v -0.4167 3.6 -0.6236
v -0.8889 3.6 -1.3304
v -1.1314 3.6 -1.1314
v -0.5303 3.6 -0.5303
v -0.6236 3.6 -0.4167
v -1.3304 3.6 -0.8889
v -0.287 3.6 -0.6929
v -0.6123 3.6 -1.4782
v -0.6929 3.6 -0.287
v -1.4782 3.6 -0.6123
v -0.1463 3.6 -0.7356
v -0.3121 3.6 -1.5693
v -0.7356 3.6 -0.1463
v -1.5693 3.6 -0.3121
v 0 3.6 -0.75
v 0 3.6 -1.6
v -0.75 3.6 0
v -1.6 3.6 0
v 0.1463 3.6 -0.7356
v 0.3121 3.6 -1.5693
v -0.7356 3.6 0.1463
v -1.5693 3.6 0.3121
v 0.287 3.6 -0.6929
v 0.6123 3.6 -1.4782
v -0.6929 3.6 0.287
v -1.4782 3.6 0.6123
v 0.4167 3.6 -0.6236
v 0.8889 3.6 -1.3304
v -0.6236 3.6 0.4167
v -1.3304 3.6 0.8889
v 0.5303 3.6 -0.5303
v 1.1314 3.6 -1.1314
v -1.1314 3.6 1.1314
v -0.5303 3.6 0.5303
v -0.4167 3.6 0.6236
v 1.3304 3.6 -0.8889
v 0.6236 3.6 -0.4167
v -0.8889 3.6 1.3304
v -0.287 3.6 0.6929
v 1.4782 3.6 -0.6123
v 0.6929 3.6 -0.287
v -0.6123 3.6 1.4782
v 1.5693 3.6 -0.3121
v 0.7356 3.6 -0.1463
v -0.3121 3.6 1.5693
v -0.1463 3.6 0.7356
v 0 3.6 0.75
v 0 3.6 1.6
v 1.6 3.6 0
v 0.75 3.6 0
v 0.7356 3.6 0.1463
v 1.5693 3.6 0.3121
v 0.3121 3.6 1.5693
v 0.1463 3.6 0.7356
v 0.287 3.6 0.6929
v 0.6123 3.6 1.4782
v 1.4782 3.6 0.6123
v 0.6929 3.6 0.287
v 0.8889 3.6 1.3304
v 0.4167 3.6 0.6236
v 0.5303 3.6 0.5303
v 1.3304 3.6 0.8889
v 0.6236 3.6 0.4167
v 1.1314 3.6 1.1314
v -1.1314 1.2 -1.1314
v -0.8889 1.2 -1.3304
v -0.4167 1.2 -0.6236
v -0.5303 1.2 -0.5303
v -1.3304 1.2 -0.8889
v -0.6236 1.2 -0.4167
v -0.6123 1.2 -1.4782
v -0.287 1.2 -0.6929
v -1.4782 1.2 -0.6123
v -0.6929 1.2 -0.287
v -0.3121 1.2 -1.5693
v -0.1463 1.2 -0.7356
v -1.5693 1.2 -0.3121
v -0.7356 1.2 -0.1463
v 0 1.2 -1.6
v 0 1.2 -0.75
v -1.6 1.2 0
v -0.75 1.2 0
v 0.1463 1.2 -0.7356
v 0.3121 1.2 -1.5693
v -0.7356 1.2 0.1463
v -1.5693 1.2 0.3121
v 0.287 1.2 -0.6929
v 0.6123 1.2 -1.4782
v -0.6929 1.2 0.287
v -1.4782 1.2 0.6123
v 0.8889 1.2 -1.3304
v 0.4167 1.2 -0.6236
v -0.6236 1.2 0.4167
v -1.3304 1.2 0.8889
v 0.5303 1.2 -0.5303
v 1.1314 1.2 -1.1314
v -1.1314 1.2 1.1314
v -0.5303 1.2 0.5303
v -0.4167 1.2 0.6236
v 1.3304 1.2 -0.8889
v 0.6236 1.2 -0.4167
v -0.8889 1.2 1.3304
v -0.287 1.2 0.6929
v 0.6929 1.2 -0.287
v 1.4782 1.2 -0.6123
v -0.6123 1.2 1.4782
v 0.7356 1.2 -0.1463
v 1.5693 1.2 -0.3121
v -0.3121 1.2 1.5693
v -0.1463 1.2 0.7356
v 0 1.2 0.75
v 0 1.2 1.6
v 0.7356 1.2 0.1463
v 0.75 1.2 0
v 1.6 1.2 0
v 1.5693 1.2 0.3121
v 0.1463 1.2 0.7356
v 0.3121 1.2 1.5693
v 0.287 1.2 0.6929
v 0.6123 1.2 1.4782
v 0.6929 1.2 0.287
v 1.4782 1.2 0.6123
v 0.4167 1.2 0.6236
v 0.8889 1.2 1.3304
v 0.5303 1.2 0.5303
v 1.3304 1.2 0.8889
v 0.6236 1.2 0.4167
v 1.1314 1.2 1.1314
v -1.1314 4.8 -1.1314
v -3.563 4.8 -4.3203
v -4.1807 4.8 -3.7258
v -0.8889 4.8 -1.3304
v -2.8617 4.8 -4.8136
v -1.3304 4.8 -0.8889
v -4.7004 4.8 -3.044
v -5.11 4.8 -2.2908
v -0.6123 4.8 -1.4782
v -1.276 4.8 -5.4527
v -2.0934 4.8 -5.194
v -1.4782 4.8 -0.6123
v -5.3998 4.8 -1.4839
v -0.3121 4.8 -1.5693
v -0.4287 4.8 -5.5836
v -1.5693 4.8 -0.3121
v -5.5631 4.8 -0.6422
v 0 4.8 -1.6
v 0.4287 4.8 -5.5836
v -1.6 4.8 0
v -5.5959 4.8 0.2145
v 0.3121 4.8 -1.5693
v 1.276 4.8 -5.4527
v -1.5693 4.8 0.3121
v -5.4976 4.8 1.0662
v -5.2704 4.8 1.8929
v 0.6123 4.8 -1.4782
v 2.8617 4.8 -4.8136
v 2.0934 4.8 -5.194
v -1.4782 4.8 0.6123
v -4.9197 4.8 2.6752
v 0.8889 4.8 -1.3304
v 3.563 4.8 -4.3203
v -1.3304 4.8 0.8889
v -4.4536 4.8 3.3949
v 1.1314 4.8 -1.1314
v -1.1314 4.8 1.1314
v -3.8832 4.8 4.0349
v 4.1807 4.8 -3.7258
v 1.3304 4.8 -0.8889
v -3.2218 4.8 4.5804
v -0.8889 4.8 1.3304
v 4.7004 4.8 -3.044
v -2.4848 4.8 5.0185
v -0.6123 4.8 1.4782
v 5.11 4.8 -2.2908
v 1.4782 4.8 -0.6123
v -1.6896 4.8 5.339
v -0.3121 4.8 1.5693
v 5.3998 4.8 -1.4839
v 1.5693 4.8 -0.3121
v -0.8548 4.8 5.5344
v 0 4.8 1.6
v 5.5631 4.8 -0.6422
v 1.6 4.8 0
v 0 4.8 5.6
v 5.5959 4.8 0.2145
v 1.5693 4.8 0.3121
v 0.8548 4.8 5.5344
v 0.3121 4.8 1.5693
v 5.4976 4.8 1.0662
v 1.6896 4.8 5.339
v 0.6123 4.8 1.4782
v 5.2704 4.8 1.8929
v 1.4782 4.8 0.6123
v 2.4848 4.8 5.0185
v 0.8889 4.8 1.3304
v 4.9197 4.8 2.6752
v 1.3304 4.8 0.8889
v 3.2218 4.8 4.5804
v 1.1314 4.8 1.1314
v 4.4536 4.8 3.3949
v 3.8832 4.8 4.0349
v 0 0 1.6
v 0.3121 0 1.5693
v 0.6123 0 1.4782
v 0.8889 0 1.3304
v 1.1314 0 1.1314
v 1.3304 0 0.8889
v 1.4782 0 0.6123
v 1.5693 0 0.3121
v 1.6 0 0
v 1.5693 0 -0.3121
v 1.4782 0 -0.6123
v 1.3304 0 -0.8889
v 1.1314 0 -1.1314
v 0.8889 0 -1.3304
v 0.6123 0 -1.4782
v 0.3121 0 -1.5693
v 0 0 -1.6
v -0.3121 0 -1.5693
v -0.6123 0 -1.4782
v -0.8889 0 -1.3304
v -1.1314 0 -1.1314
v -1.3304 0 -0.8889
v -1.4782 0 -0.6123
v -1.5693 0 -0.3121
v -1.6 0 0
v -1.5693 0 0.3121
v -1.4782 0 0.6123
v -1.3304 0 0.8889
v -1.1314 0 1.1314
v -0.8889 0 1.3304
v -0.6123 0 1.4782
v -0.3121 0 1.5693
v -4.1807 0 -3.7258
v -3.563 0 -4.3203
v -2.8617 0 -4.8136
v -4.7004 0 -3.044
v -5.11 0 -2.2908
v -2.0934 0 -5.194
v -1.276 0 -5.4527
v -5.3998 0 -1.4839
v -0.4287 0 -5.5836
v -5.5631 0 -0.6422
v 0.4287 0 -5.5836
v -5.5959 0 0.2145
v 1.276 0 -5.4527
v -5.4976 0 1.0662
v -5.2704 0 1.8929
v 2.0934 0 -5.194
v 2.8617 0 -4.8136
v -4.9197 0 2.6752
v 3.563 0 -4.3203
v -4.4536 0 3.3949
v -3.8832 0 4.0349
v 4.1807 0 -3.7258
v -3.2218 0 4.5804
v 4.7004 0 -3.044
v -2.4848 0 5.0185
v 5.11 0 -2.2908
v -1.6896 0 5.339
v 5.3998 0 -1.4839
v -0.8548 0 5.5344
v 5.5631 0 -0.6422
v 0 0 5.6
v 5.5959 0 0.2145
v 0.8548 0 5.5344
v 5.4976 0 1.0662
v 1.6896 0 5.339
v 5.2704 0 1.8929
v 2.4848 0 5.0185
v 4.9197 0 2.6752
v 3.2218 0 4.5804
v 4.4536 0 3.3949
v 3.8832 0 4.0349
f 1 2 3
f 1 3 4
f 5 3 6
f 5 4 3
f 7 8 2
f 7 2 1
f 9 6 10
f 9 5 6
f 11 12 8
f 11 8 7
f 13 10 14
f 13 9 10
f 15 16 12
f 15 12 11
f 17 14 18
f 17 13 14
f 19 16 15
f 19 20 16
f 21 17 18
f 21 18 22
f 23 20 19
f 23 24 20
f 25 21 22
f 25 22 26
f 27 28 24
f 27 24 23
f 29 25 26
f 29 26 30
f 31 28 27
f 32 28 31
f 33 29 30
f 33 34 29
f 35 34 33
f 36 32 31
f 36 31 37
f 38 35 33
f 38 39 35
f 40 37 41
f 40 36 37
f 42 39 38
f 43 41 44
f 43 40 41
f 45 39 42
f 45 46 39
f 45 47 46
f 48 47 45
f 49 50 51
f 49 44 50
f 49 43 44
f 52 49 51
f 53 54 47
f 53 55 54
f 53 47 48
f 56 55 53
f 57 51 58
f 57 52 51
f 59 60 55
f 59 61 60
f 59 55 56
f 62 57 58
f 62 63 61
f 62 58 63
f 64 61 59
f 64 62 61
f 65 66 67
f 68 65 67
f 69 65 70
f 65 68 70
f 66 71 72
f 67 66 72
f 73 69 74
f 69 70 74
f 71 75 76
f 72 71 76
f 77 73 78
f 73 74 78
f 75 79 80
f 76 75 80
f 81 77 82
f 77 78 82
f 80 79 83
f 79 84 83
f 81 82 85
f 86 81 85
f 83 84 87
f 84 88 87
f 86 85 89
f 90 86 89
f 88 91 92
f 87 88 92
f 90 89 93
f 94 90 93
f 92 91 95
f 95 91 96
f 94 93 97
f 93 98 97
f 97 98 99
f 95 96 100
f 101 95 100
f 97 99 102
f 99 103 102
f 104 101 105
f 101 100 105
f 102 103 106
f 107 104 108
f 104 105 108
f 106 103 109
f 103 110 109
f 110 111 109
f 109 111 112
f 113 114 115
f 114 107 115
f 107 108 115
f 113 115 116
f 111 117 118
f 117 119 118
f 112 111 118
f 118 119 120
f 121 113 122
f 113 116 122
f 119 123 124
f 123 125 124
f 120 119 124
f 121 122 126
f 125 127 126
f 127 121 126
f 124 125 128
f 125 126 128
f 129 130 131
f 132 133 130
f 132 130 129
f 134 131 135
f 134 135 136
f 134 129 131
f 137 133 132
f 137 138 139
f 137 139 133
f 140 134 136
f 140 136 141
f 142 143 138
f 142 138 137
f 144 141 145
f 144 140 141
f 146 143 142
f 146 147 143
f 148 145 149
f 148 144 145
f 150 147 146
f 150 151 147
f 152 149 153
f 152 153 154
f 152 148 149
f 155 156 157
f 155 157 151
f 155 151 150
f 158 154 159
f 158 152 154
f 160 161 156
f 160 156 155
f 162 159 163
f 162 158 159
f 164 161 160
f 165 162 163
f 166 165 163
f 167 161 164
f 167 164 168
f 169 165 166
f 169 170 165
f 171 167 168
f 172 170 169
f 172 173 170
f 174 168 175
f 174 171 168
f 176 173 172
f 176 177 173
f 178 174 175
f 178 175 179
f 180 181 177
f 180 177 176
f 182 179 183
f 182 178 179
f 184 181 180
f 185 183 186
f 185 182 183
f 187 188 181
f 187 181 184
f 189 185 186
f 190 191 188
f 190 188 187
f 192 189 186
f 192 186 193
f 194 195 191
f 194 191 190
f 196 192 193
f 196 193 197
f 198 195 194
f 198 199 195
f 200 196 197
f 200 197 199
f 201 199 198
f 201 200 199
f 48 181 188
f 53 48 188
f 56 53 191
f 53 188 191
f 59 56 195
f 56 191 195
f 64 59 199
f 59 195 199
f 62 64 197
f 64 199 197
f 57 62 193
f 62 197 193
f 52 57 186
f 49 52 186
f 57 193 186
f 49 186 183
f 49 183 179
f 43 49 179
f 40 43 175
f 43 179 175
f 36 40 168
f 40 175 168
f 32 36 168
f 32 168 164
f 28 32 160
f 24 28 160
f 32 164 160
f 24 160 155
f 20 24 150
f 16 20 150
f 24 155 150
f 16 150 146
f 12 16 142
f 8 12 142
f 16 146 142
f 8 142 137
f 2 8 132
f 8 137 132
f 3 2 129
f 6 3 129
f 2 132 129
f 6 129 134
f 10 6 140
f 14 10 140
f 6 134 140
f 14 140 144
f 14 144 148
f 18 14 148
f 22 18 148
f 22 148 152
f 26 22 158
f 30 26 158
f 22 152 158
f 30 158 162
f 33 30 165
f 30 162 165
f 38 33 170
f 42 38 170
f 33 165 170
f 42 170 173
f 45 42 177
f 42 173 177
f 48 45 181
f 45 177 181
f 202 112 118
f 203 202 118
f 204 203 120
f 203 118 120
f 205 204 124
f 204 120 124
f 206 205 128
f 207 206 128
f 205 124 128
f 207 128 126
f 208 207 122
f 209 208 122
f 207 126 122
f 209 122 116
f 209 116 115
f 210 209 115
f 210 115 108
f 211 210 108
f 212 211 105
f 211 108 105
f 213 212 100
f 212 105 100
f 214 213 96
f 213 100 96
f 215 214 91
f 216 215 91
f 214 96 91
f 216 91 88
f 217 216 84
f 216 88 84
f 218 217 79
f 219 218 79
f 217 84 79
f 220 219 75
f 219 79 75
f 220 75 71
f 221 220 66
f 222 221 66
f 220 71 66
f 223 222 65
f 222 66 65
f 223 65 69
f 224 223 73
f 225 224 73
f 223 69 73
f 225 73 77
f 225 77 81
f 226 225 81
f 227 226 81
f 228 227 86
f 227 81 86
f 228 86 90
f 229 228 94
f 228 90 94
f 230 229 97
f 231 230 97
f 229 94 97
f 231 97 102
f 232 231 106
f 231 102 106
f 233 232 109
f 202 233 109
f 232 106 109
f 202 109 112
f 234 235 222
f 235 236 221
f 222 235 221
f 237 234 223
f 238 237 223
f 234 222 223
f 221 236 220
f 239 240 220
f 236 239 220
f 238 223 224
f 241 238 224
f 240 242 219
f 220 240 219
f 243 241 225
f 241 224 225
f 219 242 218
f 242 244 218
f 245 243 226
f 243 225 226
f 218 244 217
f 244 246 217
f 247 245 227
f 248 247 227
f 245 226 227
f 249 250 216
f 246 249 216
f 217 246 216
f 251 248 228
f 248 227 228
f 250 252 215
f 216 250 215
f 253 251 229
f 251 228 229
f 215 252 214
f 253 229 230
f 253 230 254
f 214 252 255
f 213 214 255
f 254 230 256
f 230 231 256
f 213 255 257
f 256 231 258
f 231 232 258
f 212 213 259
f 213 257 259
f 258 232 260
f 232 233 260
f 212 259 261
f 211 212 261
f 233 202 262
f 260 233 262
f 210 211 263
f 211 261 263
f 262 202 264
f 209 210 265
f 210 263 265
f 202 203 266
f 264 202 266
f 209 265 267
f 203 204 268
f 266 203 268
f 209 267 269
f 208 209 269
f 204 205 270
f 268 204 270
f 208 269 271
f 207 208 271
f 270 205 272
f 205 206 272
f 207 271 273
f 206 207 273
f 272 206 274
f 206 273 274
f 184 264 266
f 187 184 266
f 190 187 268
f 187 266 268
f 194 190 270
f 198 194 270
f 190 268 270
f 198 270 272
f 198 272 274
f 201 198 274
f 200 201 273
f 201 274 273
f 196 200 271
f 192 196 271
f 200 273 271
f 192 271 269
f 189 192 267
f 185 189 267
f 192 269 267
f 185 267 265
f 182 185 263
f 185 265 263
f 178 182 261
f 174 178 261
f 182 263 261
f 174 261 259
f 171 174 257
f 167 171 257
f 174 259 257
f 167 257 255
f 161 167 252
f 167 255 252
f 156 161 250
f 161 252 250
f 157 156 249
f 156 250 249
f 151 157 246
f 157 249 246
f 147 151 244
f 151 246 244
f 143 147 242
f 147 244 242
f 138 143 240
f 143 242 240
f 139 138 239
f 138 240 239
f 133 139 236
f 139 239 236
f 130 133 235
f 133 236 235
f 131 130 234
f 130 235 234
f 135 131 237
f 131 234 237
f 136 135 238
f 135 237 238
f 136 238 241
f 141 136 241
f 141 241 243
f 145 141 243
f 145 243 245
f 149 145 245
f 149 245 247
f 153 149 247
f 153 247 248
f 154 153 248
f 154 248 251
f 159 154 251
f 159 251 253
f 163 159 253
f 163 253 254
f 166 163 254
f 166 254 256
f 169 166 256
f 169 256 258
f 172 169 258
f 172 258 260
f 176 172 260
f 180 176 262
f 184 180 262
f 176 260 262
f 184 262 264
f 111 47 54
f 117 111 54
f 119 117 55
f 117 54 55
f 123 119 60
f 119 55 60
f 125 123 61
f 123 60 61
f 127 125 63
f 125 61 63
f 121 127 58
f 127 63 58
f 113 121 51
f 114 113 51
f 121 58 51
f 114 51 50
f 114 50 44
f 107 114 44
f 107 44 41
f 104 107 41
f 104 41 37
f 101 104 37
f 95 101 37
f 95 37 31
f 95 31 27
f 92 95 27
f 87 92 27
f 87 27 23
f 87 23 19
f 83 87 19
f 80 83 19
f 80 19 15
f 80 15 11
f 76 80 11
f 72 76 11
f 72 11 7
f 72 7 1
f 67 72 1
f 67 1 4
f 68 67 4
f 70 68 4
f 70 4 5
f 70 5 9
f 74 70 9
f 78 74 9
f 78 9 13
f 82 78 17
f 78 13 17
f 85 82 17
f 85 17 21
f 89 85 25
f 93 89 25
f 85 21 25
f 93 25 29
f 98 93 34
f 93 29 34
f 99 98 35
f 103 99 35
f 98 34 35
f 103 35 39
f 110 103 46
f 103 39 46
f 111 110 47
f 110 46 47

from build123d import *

# Parameters (mm, degrees)
SKETCH_1_R          = 5.6
EXTRUDE_1_DEPTH     = 4.8
SKETCH_2_R          = 0.75
CUT_EXTRUDE_1_DEPTH = 10.260669522
SKETCH_2_3_R        = 1.6
CUT_EXTRUDE_2_DEPTH = 1.2
CUT_EXTRUDE_START   = -3.6
SKETCH_2_4_R        = 1.6
CUT_EXTRUDE_3_DEPTH = 1.2


with BuildPart() as part:
    # 草图1 → 凸台-拉伸1 (new body)
    with BuildSketch(Plane(origin=(0, 0, 0), x_dir=(1, 0, 0), z_dir=(0, 1, 0))):
        with Locations(Location((0, 0, 0), (0, 0, 270))):
            Circle(SKETCH_1_R)
    extrude(amount=EXTRUDE_1_DEPTH)

    # 草图2 → 切除-拉伸1 (cut, through all)
    with BuildSketch(Plane(origin=(0, 4.8, 0), x_dir=(1, 0, 0), z_dir=(0, 1, 0))):
        with Locations(Location((0, 0, 0), (0, 0, 270))):
            Circle(SKETCH_2_R)
    extrude(amount=-CUT_EXTRUDE_1_DEPTH, mode=Mode.SUBTRACT)

    # 草图2<3> → 切除-拉伸2 (cut)
    with BuildSketch(Plane(origin=(0, 4.8, 0), x_dir=(1, 0, 0), z_dir=(0, 1, 0))):
        with Locations(Location((0, 0, 0), (0, 0, 270))):
            Circle(SKETCH_2_3_R)
    extrude(amount=-CUT_EXTRUDE_2_DEPTH, mode=Mode.SUBTRACT)

    # 草图2<4> → 切除-拉伸3 (cut)
    with BuildSketch(Plane(origin=(0, 4.8, 0), x_dir=(1, 0, 0), z_dir=(0, 1, 0)).offset(CUT_EXTRUDE_START)):
        with Locations(Location((0, 0, 0), (0, 0, 270))):
            Circle(SKETCH_2_4_R)
    extrude(amount=-CUT_EXTRUDE_3_DEPTH, mode=Mode.SUBTRACT)


solid = part.part
